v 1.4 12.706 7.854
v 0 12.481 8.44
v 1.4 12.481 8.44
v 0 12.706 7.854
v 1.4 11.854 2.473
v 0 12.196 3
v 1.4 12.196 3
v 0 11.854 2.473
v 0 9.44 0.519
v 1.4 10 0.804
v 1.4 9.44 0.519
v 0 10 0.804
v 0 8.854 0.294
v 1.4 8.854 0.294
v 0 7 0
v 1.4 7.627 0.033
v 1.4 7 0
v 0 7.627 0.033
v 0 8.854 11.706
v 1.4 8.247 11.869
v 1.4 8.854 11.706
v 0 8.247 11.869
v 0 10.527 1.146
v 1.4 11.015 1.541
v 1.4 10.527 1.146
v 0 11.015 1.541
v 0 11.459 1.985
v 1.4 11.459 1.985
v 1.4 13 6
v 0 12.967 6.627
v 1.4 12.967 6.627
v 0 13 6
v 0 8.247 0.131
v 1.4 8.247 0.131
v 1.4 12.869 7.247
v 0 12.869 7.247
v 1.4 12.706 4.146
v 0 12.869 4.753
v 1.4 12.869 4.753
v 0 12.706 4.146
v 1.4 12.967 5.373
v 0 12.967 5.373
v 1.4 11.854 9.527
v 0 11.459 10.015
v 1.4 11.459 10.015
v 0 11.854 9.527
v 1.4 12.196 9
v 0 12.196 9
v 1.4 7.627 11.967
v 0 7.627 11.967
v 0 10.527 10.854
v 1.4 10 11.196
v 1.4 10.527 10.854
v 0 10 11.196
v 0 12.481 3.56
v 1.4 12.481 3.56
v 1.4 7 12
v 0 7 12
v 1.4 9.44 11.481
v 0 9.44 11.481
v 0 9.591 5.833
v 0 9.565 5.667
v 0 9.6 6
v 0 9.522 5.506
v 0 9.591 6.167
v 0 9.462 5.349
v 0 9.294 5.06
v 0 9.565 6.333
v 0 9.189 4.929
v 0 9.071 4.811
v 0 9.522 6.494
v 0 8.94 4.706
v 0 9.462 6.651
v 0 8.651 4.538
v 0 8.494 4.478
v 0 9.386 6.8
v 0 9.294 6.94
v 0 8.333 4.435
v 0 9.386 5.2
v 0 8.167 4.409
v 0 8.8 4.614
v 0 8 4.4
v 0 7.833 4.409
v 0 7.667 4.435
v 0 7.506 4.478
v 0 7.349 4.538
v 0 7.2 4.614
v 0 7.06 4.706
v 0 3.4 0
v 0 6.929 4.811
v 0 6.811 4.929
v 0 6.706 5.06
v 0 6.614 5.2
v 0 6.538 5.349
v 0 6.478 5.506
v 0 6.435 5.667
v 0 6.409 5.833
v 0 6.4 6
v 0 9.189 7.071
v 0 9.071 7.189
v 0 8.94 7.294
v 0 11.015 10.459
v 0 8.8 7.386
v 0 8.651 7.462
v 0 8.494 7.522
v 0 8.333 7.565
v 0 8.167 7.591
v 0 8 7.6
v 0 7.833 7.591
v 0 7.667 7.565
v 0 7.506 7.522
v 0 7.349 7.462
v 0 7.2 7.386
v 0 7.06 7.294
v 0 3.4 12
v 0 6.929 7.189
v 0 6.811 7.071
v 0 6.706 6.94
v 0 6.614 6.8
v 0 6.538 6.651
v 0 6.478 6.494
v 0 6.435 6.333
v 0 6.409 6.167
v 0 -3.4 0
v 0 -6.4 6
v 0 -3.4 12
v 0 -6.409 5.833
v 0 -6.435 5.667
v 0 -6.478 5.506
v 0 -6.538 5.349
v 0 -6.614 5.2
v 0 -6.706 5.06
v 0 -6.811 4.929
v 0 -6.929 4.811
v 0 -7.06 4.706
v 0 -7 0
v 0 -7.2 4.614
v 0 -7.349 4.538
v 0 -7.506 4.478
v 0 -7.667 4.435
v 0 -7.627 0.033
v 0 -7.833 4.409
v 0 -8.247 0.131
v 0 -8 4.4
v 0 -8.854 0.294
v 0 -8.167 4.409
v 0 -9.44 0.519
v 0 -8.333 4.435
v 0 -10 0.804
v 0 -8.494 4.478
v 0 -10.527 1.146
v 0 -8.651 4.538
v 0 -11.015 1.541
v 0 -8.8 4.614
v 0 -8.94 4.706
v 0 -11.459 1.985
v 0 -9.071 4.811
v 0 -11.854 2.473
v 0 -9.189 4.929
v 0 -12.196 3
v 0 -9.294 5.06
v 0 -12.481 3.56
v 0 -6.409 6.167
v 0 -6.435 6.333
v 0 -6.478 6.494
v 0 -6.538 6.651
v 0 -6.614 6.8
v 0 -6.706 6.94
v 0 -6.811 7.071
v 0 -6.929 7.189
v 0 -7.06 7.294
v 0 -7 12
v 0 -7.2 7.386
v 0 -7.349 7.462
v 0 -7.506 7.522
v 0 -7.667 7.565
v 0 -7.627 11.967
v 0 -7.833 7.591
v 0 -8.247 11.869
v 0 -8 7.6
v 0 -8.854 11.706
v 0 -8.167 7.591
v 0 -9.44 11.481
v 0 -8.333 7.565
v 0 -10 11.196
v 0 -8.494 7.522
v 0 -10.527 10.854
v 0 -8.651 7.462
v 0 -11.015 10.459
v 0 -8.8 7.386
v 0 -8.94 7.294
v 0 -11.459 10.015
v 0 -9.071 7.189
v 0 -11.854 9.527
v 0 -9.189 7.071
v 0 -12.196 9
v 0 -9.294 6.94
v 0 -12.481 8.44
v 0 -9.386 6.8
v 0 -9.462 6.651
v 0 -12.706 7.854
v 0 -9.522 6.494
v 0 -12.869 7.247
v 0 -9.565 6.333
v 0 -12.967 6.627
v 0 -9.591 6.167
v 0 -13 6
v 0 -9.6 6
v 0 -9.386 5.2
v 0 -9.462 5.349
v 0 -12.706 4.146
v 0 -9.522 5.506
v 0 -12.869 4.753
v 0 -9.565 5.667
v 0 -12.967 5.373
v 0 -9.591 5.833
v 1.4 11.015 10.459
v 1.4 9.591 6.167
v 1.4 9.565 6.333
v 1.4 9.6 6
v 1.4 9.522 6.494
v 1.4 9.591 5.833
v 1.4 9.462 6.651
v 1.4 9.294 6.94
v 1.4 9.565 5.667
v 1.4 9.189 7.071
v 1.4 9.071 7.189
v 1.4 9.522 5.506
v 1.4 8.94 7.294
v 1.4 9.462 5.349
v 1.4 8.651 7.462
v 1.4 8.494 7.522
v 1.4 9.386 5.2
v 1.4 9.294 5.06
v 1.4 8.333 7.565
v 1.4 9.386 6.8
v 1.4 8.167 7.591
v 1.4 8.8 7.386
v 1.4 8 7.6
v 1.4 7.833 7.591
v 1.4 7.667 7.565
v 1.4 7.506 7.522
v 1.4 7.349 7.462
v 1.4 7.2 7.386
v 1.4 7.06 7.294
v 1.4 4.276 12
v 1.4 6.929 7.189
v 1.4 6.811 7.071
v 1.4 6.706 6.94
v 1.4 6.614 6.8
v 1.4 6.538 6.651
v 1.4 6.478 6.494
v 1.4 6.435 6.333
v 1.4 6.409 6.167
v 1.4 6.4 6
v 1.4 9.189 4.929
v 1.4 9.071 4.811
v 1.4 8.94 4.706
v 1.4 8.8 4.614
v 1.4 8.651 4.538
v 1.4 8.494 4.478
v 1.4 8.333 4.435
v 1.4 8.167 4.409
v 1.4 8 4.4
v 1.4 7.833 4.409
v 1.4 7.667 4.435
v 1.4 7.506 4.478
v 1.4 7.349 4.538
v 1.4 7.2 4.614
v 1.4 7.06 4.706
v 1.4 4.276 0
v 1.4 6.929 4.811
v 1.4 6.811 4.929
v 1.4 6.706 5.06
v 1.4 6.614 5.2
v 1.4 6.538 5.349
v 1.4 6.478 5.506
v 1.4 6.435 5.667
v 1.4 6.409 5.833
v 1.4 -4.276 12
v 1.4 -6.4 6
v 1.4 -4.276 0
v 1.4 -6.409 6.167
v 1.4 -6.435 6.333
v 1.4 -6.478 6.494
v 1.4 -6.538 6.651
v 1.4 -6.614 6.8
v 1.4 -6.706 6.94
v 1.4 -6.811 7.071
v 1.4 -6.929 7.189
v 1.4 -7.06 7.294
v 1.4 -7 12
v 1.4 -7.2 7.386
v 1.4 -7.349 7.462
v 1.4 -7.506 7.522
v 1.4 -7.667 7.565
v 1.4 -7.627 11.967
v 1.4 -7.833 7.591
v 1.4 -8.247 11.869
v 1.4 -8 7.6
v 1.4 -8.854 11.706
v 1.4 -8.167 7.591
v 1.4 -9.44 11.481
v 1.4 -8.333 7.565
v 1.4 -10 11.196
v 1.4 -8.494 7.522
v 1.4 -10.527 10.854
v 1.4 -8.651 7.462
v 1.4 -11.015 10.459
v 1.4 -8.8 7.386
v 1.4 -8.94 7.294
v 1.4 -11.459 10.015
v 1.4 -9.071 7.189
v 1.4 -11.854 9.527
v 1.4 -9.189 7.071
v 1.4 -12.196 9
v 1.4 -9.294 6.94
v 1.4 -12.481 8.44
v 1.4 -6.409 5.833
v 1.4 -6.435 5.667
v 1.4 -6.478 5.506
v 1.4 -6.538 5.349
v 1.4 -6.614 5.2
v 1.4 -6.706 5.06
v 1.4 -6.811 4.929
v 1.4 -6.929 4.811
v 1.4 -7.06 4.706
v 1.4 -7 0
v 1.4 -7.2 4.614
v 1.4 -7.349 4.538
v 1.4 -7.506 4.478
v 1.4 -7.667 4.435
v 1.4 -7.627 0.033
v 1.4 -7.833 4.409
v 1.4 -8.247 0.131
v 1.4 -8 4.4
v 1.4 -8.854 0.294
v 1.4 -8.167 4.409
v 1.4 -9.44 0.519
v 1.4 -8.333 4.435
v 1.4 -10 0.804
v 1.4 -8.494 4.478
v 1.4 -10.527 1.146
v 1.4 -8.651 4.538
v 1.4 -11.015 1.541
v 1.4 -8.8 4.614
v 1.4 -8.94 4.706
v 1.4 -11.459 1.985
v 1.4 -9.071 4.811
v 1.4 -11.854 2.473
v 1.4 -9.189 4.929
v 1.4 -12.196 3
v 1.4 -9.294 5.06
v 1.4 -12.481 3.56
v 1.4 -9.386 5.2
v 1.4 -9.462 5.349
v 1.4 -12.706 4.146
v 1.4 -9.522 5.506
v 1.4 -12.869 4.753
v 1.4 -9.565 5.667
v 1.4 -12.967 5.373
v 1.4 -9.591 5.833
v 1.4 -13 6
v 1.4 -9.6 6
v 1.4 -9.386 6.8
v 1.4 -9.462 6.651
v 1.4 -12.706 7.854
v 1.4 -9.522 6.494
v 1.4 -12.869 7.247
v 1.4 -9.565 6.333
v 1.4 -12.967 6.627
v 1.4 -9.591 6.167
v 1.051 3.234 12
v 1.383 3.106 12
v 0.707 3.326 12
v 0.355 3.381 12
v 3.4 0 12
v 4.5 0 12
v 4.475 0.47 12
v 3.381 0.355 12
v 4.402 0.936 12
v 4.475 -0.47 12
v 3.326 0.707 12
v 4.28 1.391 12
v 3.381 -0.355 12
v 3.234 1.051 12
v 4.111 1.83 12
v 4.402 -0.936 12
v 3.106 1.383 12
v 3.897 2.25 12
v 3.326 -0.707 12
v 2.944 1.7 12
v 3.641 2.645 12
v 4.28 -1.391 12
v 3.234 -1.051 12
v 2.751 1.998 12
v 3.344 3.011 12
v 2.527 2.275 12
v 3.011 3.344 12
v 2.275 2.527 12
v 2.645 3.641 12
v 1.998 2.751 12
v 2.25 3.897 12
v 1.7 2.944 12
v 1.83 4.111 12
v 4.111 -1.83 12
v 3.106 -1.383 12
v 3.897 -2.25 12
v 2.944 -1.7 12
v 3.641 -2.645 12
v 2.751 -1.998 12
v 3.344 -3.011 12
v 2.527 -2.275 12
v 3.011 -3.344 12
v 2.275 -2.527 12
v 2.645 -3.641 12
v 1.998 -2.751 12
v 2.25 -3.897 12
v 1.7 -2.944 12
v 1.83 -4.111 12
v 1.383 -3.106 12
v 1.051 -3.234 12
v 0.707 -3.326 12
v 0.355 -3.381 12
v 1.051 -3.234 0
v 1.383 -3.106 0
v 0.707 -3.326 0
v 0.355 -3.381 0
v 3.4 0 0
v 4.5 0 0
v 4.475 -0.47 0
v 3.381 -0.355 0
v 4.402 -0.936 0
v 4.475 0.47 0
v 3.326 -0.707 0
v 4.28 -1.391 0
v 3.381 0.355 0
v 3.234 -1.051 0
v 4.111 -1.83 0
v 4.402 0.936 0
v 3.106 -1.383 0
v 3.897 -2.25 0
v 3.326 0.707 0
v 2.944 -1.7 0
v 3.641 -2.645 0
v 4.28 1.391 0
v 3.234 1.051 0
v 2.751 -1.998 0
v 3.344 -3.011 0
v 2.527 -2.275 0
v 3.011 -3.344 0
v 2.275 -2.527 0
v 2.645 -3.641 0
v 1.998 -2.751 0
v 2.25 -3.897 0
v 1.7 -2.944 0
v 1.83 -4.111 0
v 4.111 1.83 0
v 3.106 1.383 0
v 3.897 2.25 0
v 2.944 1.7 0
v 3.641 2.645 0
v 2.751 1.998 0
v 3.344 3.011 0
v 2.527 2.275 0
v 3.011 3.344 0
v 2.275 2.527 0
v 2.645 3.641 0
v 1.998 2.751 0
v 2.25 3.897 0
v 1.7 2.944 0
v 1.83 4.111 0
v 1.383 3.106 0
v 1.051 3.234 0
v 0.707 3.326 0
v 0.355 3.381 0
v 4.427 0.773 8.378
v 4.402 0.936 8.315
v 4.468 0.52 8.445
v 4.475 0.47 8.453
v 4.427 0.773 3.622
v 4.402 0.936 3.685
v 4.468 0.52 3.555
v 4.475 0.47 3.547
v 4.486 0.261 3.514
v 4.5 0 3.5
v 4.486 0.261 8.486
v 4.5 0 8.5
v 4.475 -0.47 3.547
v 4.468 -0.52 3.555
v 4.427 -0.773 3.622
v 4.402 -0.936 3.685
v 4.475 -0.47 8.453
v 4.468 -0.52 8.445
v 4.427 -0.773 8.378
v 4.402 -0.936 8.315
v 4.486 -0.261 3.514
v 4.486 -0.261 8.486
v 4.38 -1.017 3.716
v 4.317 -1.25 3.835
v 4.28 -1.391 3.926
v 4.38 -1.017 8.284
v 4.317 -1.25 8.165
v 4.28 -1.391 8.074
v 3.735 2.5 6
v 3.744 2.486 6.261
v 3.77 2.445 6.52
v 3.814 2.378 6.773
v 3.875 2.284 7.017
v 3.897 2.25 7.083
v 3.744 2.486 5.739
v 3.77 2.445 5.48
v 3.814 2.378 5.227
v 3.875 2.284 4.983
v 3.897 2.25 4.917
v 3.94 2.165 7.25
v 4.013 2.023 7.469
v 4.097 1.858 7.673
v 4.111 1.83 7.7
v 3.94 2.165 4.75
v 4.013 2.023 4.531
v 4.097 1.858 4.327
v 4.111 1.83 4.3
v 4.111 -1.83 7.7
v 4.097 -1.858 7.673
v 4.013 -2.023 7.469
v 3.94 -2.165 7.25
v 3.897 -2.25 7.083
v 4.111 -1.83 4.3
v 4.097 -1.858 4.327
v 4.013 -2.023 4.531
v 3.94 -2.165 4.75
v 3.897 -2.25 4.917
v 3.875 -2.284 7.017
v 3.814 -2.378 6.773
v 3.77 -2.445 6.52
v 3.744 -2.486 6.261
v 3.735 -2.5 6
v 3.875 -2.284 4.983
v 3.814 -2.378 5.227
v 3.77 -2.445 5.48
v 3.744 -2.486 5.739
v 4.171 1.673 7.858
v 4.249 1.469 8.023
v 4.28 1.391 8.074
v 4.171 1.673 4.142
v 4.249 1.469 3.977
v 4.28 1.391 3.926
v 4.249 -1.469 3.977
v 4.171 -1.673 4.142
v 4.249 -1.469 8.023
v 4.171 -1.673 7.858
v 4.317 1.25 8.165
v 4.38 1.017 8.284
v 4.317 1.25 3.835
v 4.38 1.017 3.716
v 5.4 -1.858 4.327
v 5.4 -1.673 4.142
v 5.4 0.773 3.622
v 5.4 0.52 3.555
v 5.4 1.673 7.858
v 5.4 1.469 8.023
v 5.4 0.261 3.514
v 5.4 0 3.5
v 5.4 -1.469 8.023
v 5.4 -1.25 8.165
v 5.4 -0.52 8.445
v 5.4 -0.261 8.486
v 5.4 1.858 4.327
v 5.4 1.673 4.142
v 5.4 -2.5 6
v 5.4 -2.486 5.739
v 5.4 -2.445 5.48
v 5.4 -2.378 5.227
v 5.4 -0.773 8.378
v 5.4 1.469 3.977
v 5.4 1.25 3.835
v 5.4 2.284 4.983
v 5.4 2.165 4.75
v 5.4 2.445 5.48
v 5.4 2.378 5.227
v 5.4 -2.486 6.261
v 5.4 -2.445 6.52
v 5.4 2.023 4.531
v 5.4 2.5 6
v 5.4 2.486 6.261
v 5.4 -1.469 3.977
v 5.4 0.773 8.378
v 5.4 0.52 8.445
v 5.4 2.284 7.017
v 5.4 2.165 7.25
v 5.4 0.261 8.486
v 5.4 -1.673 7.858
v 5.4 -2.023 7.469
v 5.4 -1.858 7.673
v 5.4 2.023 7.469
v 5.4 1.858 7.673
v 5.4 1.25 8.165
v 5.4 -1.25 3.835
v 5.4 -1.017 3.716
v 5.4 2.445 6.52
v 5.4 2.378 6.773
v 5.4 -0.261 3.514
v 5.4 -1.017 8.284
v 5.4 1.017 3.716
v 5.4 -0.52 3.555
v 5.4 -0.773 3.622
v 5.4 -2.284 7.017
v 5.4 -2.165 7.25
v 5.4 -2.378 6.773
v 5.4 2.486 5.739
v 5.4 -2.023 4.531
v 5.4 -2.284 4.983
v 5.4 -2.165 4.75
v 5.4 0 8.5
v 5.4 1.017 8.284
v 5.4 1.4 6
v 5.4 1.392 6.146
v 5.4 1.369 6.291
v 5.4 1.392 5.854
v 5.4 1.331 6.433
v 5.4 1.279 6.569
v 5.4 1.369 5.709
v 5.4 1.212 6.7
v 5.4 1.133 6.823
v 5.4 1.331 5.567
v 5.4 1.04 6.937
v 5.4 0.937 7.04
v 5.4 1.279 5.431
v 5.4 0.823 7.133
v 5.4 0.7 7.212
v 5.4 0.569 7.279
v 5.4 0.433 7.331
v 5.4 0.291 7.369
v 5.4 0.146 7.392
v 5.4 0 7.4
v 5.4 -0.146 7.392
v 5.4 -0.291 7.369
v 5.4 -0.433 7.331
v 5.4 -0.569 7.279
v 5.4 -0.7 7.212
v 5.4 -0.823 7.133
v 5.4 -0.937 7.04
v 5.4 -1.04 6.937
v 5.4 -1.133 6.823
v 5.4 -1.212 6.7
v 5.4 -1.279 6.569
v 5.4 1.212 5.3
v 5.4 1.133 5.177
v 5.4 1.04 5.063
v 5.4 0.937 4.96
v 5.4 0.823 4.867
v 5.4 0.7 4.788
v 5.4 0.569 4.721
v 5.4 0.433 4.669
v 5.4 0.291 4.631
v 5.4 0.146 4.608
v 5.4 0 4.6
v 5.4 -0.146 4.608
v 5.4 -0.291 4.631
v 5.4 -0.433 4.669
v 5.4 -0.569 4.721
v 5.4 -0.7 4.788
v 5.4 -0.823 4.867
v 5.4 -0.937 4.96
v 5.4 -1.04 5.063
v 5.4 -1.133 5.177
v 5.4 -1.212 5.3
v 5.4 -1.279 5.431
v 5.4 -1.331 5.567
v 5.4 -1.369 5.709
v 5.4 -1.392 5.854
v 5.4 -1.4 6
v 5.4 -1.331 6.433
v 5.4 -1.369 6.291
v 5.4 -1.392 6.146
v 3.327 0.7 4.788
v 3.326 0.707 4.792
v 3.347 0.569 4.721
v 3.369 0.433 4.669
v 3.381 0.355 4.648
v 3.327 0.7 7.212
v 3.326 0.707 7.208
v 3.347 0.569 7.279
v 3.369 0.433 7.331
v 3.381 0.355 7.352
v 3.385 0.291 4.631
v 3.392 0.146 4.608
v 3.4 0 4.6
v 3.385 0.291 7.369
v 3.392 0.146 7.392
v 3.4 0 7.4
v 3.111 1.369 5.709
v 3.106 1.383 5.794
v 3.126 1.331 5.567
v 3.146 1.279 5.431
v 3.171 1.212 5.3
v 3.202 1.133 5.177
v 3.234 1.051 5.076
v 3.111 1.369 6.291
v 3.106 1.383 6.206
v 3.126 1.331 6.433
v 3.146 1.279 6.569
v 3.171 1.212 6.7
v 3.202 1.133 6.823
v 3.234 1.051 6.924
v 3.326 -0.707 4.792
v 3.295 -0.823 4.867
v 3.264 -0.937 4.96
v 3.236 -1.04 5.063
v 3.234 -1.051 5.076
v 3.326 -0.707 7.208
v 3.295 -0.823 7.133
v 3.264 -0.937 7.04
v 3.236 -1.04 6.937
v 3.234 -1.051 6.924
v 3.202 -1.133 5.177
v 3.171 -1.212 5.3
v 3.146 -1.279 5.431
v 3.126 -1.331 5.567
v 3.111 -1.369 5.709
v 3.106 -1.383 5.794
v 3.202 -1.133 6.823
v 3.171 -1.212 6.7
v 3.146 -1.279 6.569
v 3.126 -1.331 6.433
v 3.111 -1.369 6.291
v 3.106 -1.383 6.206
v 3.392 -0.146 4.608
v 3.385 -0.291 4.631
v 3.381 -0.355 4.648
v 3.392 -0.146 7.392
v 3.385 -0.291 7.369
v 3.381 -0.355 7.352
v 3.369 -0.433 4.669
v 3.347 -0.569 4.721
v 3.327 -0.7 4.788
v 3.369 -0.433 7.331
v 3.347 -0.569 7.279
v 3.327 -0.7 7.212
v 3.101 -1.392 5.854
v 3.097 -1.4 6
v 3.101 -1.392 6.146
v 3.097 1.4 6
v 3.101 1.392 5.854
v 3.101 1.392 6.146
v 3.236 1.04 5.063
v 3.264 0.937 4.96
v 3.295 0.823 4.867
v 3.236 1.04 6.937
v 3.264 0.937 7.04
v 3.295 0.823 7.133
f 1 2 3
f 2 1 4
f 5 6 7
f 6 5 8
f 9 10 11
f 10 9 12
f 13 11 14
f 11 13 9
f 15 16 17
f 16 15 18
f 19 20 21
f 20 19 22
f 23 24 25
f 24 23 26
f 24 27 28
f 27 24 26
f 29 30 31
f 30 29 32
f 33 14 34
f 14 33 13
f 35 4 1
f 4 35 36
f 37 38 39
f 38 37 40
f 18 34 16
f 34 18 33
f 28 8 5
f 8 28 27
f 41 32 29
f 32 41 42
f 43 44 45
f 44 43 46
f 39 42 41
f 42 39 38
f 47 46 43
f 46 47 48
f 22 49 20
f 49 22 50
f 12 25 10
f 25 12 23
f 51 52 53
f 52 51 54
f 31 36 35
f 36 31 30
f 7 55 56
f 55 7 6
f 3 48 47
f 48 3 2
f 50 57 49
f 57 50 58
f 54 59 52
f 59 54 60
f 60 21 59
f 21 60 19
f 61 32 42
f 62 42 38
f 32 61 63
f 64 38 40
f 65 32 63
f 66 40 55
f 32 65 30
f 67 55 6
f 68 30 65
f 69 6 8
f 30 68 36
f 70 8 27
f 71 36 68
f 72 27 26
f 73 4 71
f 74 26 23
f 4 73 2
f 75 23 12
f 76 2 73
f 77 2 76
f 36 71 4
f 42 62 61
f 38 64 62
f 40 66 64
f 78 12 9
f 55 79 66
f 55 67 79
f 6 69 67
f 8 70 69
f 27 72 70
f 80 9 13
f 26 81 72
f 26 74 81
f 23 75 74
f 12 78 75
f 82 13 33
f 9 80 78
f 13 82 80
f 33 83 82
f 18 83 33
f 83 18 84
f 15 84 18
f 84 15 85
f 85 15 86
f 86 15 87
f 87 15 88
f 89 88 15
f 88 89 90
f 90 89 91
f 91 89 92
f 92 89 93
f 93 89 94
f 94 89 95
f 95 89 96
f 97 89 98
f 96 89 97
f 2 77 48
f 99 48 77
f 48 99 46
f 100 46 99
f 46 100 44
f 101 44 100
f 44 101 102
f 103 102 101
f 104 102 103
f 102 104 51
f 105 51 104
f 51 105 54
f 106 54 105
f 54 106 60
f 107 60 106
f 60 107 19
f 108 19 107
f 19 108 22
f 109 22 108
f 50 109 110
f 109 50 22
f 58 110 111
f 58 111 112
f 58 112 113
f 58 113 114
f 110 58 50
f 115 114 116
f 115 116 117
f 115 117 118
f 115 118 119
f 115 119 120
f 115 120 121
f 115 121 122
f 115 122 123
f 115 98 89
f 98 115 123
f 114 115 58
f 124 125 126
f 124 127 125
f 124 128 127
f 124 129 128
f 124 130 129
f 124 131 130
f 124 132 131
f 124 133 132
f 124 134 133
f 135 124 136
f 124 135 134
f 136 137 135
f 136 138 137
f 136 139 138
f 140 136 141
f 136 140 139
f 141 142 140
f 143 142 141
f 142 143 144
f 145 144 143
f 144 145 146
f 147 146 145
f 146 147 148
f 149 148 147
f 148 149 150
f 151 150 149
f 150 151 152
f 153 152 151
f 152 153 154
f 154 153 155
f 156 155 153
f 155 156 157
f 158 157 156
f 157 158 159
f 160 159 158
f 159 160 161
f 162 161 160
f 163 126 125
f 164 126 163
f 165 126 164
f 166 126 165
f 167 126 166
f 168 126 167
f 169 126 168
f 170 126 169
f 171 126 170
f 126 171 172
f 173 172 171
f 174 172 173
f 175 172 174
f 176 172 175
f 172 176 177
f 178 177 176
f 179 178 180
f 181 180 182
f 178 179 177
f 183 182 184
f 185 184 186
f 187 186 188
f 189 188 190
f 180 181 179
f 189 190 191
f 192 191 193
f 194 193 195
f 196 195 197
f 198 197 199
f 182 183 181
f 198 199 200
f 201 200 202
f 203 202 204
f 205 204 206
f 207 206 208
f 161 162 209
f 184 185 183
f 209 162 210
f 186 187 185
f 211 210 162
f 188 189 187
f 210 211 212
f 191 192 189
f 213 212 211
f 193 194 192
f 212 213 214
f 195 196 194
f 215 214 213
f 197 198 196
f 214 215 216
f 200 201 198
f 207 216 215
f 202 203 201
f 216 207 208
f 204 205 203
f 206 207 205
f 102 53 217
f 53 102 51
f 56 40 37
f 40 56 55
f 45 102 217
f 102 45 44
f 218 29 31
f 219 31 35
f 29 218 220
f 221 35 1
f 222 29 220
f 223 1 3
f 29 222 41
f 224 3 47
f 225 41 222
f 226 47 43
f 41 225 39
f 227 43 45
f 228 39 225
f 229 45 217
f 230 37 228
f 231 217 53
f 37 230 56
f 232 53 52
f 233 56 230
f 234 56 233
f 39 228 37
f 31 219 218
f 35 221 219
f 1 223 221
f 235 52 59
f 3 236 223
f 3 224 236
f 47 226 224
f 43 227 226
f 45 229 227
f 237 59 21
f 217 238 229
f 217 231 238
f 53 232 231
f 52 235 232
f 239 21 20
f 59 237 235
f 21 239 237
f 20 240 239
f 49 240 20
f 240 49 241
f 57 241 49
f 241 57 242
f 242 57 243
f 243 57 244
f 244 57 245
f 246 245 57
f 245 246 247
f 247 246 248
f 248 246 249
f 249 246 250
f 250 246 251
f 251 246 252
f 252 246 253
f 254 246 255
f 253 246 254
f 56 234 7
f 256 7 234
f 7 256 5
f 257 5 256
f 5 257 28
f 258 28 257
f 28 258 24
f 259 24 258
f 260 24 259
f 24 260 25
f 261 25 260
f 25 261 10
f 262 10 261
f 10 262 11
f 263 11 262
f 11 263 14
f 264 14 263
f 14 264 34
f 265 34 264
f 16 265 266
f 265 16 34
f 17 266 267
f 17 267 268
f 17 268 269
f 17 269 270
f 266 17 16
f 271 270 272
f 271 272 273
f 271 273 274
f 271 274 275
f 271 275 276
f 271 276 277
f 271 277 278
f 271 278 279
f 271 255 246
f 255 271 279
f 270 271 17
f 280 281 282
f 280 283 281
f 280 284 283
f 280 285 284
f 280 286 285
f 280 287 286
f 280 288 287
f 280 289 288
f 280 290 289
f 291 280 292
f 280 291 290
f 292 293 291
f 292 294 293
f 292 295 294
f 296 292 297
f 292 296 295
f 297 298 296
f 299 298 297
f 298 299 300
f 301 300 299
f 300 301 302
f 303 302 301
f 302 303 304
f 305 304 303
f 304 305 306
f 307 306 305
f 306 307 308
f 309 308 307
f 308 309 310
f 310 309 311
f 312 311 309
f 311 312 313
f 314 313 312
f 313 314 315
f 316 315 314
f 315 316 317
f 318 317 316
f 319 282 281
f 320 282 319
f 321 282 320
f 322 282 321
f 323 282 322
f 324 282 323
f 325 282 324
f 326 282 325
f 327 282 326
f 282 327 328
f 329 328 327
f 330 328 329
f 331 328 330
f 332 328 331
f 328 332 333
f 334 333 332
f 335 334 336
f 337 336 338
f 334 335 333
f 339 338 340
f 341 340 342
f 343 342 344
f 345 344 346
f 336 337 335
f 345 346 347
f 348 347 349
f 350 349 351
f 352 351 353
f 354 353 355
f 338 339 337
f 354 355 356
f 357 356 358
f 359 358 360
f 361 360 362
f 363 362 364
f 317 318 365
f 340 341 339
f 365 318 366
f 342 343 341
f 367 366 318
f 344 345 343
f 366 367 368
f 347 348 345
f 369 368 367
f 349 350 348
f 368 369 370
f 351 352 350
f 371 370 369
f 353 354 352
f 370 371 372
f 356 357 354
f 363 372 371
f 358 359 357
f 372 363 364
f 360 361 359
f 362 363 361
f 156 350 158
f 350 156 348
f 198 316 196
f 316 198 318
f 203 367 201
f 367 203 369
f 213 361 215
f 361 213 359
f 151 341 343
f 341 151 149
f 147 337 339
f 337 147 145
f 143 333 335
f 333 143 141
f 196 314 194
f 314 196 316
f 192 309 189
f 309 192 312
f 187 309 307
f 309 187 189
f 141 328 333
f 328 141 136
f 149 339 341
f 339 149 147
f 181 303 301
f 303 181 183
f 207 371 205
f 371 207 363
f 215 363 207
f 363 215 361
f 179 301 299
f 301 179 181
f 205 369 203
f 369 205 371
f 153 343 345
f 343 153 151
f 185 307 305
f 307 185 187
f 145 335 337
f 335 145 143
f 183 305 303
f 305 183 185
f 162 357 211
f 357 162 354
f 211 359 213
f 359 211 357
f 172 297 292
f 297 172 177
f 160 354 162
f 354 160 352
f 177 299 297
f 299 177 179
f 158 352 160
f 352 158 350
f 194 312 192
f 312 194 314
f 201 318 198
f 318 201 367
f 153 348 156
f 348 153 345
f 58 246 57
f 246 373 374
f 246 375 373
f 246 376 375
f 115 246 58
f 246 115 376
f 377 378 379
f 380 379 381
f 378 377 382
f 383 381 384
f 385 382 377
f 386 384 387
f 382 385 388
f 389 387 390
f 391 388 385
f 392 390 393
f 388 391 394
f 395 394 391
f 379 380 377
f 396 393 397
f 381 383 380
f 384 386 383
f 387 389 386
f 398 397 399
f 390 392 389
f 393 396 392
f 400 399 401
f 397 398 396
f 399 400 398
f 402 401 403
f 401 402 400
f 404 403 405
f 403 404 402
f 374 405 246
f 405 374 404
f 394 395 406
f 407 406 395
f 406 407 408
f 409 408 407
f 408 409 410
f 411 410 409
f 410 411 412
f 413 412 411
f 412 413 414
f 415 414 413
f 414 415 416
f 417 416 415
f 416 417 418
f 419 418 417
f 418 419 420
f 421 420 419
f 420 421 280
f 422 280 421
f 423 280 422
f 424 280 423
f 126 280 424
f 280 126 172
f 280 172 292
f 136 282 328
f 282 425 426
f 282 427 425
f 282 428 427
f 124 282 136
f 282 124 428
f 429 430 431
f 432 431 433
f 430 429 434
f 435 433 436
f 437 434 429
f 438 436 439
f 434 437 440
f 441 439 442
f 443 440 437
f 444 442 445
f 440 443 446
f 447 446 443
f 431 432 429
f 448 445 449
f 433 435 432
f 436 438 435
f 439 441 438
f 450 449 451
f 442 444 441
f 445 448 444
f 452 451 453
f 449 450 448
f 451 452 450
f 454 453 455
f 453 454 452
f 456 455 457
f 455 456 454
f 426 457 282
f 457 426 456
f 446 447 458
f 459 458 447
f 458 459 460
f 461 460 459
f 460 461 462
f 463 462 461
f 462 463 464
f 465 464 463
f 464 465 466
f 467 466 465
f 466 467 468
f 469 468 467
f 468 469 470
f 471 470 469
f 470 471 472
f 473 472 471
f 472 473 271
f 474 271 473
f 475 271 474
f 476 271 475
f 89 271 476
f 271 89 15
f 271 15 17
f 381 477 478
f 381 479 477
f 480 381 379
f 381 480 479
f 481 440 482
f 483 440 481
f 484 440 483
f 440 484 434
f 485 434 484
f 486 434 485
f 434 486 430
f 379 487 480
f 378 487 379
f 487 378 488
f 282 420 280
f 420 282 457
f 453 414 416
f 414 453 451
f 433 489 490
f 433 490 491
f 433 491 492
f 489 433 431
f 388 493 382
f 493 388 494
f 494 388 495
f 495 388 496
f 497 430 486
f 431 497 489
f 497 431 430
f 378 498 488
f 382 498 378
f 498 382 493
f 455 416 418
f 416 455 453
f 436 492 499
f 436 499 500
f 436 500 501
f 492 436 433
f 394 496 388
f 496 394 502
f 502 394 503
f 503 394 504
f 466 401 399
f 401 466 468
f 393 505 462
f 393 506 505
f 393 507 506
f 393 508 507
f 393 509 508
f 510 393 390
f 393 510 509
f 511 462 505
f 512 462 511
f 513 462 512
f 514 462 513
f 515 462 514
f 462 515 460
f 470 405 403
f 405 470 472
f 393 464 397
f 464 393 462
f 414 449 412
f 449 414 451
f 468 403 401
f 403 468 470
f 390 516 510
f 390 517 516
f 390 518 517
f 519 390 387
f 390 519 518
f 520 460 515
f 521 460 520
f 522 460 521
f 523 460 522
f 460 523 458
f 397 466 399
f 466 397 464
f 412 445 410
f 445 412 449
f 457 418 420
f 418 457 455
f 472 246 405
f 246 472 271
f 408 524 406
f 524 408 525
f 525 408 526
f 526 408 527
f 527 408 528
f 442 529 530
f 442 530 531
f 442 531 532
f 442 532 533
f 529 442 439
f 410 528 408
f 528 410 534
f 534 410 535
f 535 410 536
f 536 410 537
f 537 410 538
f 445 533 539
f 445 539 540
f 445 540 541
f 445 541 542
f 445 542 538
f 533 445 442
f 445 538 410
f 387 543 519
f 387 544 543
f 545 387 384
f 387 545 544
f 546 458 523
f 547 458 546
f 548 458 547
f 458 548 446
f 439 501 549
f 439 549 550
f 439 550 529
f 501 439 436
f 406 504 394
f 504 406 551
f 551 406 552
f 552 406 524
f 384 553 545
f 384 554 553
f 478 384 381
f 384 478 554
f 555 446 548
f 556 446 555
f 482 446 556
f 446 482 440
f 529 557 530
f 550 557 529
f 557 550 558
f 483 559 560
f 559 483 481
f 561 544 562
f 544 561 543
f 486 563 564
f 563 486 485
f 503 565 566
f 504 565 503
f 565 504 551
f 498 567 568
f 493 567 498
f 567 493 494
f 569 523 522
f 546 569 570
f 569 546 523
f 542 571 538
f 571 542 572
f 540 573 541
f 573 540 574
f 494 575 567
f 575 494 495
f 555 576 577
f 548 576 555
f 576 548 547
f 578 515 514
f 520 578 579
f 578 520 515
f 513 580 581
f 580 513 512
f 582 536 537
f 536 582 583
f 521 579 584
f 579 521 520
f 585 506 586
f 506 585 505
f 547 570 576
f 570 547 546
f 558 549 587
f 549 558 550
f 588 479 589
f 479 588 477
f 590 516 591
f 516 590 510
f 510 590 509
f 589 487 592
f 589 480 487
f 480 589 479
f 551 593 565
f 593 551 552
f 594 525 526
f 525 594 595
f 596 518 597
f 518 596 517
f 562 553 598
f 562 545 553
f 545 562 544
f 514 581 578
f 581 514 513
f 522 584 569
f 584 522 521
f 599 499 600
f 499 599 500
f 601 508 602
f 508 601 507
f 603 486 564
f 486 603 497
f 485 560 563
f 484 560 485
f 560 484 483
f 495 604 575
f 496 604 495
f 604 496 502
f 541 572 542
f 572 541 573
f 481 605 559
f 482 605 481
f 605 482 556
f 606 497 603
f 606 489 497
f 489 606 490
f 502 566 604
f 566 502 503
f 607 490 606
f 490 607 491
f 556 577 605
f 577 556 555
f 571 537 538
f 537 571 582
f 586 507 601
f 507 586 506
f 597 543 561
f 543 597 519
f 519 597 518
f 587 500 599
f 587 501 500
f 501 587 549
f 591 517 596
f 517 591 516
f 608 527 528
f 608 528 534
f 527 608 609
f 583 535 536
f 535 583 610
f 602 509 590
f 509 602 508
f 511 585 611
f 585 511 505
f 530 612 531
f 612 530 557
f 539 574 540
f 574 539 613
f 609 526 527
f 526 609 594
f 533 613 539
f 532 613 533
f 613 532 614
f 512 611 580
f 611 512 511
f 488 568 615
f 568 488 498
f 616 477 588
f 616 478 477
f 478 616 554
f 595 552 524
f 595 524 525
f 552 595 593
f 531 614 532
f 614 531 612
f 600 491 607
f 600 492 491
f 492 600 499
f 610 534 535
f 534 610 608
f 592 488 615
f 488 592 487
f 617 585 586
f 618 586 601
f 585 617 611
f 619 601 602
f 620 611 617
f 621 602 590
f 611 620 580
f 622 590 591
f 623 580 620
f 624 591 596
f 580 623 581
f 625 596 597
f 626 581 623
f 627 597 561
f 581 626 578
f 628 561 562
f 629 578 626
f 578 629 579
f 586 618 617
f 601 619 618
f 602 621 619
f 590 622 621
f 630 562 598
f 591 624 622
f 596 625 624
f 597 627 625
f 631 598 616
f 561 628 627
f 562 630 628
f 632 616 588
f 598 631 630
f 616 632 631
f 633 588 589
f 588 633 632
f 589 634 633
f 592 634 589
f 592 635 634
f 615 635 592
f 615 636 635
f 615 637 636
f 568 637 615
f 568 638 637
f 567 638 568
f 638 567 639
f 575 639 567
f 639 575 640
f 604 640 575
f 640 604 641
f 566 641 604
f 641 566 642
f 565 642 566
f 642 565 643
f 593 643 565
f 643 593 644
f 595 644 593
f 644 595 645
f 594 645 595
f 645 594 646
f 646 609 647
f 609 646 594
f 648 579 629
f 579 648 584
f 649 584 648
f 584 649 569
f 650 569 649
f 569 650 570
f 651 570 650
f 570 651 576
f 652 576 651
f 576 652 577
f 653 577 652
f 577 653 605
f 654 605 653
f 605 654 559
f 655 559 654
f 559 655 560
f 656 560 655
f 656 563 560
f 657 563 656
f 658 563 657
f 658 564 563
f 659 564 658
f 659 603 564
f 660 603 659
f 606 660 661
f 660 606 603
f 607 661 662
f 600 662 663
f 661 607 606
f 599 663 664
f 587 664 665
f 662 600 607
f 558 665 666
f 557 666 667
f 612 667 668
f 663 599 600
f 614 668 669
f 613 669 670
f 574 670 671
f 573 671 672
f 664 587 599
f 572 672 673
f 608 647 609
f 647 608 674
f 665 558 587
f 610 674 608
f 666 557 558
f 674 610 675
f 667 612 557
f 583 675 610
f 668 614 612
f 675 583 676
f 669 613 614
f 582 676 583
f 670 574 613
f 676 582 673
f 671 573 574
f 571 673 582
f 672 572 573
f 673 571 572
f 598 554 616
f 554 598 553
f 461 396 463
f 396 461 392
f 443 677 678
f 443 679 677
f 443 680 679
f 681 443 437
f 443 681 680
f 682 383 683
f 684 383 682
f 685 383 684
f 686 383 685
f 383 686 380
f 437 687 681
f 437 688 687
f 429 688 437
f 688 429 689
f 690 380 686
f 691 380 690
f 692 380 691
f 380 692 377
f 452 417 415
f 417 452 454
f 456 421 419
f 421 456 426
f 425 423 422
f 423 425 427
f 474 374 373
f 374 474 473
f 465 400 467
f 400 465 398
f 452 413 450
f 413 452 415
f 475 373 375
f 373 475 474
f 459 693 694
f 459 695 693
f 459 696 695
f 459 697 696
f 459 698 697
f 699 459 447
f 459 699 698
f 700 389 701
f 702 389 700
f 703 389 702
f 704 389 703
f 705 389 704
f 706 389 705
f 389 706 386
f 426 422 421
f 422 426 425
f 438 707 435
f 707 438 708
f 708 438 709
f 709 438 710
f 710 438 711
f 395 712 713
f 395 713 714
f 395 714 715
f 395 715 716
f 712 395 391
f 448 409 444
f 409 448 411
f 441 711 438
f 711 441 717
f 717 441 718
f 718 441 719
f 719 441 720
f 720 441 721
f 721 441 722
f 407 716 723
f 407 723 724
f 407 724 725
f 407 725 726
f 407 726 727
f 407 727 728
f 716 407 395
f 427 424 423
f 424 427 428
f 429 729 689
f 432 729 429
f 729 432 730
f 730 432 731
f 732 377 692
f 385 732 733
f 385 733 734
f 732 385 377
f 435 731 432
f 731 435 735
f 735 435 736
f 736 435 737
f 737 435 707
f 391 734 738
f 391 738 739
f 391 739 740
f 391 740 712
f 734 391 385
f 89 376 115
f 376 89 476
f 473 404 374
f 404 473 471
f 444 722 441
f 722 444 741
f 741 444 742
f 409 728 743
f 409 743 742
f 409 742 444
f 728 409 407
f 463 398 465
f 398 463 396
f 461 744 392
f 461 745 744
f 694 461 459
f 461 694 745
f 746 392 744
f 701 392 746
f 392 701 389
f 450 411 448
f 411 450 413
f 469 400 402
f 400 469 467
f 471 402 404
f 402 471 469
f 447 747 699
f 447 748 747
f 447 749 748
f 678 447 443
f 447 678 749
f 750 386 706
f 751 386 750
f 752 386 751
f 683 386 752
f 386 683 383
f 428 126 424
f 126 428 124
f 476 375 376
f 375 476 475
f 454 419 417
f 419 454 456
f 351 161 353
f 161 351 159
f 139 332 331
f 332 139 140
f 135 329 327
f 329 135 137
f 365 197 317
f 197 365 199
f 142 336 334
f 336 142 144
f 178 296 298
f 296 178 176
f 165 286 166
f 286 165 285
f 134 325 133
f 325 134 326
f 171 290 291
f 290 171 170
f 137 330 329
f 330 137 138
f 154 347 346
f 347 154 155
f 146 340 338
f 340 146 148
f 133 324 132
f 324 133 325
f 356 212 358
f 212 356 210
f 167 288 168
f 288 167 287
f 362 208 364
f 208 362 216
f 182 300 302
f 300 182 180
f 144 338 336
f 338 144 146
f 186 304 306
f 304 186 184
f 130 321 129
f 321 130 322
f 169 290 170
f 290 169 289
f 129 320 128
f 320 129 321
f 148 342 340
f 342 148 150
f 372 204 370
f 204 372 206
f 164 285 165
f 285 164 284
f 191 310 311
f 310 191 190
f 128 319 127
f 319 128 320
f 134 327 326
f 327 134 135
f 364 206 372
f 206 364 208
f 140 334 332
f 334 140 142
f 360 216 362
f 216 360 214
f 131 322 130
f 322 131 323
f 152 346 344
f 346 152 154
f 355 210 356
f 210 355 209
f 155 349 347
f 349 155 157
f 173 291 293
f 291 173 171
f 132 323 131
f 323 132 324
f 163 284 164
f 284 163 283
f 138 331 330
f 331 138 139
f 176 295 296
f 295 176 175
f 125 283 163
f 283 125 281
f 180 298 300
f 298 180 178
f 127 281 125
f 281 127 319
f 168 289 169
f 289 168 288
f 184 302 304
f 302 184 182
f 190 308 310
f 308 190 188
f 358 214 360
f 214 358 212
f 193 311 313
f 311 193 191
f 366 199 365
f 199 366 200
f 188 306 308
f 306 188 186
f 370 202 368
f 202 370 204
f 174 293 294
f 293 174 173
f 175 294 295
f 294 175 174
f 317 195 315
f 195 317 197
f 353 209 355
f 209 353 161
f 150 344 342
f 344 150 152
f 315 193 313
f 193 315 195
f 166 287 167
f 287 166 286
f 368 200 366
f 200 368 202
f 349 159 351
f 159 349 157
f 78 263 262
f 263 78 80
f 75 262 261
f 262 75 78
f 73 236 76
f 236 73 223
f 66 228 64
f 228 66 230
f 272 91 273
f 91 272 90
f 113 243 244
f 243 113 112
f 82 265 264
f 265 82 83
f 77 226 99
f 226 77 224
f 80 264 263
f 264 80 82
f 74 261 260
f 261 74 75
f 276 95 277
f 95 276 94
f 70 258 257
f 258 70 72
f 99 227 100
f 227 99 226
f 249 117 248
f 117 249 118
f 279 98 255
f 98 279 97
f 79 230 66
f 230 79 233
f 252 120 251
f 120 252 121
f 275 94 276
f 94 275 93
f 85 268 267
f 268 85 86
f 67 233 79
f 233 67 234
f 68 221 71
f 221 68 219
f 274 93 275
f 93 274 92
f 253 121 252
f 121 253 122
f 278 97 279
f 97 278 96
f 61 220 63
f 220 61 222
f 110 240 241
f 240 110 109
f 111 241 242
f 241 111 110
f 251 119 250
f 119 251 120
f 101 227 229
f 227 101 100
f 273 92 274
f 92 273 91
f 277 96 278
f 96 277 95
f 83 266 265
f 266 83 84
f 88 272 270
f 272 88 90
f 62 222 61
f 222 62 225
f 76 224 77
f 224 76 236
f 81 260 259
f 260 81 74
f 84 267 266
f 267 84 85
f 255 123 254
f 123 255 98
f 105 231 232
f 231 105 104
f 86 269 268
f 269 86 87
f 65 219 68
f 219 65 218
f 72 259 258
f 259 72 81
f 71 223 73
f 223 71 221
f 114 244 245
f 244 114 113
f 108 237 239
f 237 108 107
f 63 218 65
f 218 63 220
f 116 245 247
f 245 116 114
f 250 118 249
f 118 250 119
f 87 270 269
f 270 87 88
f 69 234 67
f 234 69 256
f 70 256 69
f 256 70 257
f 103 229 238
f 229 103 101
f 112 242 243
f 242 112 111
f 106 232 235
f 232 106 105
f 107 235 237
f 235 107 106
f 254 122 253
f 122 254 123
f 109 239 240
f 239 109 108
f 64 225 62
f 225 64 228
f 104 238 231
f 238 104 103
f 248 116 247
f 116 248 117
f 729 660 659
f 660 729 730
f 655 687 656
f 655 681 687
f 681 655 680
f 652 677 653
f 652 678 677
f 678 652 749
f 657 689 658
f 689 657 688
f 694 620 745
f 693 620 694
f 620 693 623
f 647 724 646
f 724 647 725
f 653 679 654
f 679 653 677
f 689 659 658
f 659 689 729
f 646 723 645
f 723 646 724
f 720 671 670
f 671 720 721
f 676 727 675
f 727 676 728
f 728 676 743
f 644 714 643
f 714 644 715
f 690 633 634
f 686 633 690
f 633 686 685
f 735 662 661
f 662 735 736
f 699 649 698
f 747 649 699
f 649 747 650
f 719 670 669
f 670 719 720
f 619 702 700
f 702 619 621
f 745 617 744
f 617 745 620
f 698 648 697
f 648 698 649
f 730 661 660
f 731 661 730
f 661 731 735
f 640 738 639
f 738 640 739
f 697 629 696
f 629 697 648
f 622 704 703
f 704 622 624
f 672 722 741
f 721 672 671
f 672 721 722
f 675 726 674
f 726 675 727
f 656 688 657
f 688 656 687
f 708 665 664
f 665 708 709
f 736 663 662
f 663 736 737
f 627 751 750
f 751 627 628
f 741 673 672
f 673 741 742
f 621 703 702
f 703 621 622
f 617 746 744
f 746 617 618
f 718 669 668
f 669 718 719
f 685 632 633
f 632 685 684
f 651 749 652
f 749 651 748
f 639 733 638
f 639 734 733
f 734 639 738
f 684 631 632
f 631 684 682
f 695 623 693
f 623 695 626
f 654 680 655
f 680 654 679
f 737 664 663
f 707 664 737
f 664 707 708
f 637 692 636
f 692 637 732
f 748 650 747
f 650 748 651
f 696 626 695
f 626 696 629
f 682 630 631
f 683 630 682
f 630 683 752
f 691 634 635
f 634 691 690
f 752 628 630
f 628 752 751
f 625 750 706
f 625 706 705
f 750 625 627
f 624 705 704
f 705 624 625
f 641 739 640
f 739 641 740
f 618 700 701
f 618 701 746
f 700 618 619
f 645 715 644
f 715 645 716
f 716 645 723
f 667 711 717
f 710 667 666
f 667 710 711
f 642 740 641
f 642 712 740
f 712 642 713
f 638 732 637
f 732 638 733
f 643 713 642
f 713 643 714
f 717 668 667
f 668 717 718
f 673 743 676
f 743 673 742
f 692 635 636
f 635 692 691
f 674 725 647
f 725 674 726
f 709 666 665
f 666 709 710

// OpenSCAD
$fn = 60;

module armTensor (height = 12, thickness = 1.4) {
    
    difference() {
        union() {
                        
            //right side cylinder
            translate([0, 7, height/2]) 
                rotate([0, 90, 0])
                    cylinder(r = height/2, h = thickness);
            
            //left side cylinder
            translate([0, -7, height/2]) 
                rotate([0, 90, 0])
                    cylinder(r = height/2, h = thickness);
            
            //center cube
            translate([0, -7, 0]) 
                cube([thickness, 14, height]);
            
            //center cylinder
            cylinder(r=4.5, h = height);
            
            //center bolt cylinder 
            translate([thickness, 0, height/2]) 
                rotate([0, 90, 0])
                    cylinder(r=2.5, h = 4);
        }
            
        //center cylinder role
        translate([0, 0, -1]) 
            cylinder(r=4.5 - 1.1, h = height + 2);
        
        //left role
        translate([-2, -8, height/2]) 
            rotate([0, 90, 0])
                cylinder(r=3.0/2 + 0.1, h = 6);
        
        //right role
        translate([-thickness, 8, height/2]) 
            rotate([0, 90, 0])
                cylinder(r=3.0/2 + 0.1, h = 6);
        
        //upside cut
        translate([-6, -14, -1]) 
            cube([6, 28, height+2]);
            
        //center bolt role 
        translate([1, 0, height/2]) 
            rotate([0, 90, 0])
                cylinder(r=3.0/2 - 0.1, h = 6);
    
    }
    
}

armTensor();


//rotate([0, 0, 180])
//    armTensor();
